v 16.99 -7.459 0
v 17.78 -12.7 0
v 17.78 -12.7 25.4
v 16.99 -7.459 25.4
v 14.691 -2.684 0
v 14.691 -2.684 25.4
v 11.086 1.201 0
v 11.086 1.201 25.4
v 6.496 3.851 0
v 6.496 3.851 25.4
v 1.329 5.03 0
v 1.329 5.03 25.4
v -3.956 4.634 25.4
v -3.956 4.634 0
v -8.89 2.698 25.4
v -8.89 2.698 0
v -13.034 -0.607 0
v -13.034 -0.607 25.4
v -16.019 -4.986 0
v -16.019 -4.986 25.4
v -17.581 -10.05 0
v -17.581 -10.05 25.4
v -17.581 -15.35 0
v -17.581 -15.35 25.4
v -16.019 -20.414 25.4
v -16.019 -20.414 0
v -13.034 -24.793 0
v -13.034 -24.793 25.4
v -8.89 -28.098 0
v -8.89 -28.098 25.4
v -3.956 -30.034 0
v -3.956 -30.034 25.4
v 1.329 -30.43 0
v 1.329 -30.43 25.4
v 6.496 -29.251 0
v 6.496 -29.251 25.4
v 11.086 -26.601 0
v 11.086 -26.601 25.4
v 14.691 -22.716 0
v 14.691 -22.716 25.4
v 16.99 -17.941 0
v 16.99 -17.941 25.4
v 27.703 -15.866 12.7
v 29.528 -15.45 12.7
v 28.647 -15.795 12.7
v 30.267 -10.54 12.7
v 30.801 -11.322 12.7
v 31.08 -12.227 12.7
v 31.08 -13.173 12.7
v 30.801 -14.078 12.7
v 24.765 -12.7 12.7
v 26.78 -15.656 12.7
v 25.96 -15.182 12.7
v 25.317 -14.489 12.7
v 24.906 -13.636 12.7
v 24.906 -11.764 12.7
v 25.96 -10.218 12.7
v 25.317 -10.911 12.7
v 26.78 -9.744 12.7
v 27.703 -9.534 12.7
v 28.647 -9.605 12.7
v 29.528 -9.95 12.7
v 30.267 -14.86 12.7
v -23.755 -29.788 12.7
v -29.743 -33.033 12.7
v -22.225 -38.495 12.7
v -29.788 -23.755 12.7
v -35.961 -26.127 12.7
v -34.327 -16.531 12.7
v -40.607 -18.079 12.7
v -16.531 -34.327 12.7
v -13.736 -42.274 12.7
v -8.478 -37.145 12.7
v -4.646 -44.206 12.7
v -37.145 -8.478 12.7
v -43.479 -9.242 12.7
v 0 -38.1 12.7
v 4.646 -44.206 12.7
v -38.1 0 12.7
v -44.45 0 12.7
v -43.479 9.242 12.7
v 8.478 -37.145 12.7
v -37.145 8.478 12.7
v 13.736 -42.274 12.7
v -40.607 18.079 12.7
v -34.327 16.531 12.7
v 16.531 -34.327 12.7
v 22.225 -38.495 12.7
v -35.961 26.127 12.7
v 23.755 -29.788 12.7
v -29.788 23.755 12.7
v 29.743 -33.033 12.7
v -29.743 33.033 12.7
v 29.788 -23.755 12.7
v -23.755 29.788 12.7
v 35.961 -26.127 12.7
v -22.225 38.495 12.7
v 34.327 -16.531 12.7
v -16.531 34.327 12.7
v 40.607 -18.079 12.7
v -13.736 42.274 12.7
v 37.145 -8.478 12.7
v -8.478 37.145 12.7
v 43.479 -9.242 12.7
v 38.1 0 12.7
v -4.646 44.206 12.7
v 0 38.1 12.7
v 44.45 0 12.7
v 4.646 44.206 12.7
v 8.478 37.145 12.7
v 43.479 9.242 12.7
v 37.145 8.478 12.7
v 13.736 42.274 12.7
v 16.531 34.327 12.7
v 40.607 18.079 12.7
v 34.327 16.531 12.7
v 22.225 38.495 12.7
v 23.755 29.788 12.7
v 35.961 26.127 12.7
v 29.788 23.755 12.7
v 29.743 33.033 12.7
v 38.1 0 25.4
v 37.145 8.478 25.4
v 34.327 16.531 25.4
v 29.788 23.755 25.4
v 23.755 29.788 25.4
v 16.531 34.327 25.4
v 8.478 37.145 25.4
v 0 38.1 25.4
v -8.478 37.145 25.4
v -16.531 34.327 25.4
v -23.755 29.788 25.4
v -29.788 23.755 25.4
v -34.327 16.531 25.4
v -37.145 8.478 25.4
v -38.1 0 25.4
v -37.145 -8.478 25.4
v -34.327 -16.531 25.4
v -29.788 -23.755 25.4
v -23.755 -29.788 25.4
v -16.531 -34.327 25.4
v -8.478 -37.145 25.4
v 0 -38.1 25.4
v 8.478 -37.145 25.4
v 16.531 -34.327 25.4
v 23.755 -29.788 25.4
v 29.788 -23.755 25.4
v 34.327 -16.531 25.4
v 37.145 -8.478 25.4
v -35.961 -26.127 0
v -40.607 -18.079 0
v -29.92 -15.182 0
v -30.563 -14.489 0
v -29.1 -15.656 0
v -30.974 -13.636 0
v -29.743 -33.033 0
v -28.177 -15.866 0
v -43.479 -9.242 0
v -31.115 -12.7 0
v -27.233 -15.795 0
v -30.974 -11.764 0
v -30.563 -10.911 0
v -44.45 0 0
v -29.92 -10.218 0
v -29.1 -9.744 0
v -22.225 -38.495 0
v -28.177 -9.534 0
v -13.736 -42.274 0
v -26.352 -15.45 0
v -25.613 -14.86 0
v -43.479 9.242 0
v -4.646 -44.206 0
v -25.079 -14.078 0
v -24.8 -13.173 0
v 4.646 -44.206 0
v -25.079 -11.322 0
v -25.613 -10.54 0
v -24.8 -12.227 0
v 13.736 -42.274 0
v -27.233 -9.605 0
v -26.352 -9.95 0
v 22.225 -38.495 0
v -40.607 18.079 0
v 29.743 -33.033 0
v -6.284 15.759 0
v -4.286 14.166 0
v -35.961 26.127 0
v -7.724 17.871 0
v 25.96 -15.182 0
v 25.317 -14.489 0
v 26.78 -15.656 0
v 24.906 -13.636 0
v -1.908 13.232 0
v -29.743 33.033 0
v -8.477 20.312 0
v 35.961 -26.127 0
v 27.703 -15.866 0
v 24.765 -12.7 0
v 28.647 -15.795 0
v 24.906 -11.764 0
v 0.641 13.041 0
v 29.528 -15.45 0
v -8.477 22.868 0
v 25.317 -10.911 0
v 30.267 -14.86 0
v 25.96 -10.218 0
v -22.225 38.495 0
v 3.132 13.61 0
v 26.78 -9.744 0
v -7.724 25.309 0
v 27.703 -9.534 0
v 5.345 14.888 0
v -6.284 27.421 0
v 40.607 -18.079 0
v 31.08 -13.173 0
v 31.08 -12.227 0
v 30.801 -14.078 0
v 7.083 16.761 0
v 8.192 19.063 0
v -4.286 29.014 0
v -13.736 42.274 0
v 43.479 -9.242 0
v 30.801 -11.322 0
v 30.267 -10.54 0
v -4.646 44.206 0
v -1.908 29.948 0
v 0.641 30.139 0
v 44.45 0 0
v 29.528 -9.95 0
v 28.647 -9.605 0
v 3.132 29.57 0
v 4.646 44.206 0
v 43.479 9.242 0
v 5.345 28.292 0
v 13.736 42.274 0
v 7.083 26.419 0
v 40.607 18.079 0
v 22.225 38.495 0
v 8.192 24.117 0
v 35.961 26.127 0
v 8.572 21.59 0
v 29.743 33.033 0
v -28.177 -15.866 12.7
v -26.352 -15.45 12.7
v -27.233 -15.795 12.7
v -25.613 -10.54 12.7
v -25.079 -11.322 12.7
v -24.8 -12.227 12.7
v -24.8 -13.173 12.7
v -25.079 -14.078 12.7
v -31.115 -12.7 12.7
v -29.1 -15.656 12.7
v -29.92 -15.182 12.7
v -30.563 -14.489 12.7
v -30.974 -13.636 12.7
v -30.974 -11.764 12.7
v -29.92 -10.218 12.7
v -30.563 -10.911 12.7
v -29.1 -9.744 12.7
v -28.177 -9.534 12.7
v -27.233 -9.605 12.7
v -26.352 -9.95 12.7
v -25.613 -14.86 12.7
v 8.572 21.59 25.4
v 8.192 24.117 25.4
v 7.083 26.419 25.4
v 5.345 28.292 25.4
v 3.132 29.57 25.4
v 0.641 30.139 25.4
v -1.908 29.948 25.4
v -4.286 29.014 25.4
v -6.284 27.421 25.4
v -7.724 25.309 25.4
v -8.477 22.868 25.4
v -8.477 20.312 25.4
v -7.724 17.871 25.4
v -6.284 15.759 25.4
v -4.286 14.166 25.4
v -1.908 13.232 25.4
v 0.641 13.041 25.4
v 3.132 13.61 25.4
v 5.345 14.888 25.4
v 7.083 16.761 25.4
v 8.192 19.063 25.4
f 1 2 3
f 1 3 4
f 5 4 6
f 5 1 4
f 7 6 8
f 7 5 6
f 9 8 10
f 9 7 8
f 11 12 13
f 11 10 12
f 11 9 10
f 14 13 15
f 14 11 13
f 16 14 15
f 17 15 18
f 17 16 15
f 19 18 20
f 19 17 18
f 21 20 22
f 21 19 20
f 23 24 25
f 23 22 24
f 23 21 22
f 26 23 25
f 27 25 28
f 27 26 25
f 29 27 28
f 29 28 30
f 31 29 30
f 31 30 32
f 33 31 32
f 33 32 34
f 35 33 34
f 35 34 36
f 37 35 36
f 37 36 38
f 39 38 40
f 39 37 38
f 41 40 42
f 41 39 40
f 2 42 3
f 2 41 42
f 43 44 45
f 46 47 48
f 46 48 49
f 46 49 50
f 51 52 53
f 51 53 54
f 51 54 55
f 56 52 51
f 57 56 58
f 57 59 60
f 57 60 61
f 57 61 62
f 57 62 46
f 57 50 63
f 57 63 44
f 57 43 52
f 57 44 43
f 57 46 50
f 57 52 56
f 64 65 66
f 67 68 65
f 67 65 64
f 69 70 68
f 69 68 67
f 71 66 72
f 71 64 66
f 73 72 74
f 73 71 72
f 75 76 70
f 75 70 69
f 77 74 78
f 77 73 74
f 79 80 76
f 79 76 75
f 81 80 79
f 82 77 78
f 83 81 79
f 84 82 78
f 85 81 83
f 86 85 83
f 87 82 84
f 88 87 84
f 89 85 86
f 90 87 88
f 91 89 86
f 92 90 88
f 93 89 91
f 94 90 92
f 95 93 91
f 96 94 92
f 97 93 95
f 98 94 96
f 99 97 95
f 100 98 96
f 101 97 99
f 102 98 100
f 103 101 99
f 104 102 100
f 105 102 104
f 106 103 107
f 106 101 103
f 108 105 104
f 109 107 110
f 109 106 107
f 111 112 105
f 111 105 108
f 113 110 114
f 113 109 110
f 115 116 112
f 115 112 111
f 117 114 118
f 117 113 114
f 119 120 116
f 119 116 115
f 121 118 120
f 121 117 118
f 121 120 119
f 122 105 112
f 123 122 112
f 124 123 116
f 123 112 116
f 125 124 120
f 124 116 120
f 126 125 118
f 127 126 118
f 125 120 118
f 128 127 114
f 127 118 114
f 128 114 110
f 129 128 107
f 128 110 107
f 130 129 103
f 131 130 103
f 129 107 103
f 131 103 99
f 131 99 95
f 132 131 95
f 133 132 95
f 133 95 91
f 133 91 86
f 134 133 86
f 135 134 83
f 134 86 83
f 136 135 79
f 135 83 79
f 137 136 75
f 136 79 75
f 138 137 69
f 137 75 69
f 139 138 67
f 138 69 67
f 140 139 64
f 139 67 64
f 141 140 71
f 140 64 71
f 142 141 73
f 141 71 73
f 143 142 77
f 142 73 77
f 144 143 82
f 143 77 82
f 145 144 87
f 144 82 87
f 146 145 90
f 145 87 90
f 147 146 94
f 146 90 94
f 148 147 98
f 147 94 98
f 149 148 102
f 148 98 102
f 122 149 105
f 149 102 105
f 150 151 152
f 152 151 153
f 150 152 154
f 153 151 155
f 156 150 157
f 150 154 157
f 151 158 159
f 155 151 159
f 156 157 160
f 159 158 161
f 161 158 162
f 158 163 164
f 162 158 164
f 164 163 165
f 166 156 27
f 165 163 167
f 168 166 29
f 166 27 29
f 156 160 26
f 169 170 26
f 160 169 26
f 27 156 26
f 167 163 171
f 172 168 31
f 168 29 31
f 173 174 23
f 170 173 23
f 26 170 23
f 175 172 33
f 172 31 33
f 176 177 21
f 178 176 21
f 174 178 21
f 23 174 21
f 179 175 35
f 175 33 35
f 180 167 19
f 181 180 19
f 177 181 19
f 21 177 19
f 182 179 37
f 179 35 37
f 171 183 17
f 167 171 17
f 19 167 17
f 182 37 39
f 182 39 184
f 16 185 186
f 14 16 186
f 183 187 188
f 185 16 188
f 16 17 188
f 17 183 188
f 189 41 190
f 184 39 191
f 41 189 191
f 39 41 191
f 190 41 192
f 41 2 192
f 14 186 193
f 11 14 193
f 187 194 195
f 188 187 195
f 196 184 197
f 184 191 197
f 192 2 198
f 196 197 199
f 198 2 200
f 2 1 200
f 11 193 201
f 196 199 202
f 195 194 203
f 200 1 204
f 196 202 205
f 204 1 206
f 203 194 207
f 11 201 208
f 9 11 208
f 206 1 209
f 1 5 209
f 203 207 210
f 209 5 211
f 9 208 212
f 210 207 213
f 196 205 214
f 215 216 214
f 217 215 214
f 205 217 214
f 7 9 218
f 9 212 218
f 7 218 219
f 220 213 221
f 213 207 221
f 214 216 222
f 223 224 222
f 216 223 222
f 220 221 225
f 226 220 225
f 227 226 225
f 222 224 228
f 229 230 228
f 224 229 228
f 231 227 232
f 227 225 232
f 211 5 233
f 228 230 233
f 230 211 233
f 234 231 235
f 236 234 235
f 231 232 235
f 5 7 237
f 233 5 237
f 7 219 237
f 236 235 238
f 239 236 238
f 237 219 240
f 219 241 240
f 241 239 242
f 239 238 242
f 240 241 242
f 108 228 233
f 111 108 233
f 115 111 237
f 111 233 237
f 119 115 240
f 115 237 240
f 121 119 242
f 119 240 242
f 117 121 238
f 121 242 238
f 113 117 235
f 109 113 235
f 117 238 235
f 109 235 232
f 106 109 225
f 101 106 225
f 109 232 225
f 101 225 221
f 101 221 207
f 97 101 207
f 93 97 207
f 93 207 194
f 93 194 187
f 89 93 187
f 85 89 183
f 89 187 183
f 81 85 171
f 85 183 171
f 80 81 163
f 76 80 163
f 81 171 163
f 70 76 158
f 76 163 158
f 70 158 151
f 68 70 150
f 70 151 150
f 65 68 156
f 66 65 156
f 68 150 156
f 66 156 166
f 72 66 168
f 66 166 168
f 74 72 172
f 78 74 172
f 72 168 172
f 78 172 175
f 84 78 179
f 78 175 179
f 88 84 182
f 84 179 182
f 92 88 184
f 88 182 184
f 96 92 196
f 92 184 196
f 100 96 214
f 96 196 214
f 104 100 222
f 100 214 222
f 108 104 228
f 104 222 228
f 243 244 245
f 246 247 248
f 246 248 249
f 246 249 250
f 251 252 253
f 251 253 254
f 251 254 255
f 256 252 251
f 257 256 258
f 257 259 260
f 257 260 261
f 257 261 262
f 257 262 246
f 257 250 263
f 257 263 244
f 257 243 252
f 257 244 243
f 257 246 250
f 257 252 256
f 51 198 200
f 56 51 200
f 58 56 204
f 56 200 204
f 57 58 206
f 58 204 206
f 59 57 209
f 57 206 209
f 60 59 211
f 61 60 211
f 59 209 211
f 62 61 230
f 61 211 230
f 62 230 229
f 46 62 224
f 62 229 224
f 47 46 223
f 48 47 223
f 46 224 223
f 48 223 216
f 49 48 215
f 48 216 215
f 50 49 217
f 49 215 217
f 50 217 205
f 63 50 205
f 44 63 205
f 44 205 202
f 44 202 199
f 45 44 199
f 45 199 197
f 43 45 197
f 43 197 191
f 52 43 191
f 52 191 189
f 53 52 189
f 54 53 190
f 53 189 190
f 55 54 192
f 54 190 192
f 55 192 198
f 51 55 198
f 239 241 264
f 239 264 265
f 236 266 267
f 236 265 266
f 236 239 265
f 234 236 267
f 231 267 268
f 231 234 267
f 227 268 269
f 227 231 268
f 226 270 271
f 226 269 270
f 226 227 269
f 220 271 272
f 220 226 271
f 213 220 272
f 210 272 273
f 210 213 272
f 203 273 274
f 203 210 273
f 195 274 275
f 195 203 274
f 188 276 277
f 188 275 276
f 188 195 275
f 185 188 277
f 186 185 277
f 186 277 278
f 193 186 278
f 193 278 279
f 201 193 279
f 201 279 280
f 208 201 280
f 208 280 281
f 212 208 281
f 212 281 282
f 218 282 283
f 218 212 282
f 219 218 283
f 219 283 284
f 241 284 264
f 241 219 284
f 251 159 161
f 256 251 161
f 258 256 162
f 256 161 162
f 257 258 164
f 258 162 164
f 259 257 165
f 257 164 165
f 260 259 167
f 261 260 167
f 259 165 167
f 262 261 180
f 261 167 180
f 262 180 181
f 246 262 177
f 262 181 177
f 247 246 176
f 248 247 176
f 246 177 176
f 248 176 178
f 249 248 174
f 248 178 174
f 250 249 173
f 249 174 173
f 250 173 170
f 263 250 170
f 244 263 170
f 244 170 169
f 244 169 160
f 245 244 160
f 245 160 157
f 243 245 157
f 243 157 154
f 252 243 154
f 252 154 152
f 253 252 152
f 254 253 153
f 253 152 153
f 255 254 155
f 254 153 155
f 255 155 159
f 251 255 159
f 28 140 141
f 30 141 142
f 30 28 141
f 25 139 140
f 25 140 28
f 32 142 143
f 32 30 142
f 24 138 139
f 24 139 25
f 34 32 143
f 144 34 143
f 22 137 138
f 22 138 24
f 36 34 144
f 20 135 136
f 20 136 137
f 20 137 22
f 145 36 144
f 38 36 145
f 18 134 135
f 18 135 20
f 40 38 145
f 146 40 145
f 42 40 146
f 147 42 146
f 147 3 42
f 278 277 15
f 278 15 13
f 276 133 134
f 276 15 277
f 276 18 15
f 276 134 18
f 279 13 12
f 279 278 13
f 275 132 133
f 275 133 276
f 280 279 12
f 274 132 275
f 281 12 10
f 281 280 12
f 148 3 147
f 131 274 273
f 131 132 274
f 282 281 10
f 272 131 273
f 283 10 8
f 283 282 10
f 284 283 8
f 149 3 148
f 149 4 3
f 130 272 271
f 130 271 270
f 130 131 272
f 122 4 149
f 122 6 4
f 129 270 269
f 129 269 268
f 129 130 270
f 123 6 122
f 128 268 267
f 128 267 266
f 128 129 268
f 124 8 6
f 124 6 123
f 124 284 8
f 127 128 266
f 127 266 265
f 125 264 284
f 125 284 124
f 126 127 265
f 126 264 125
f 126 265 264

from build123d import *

# Parameters (mm, degrees)
SKETCH1_R               = 44.45
BOSS_EXTRUDE1_DEPTH     = 12.7
SKETCH2_R               = 38.1
BOSS_EXTRUDE2_DEPTH     = 12.7
CUT_EXTRUDE1_DEPTH      = 68.7994469
CUT_EXTRUDE1_DEPTH_BACK = 68.7994469
SKETCH3_R               = 8.5725
CUT_EXTRUDE3_DEPTH      = 68.7994469
CUT_EXTRUDE3_DEPTH_BACK = 68.7994469
SKETCH4_R               = 17.78
SKETCH5_R               = 3.175
CUT_EXTRUDE4_DEPTH      = 12.7


with BuildPart() as part:
    # Sketch1 → Boss-Extrude1 (new body)
    with BuildSketch(Plane.XY):
        Circle(SKETCH1_R)
    extrude(amount=BOSS_EXTRUDE1_DEPTH)

    # Sketch2 → Boss-Extrude2 (add)
    with BuildSketch(Plane.XY.offset(12.7)):
        Circle(SKETCH2_R)
    extrude(amount=BOSS_EXTRUDE2_DEPTH)

    # Sketch3 → Cut-Extrude1 (cut, two sides: drawn at the far end of the back side and taken through both)
    with BuildSketch(Plane.XY.offset(25.4).offset(-CUT_EXTRUDE1_DEPTH_BACK)):
        with Locations((0, 21.59)):
            Circle(SKETCH3_R)
    extrude(amount=CUT_EXTRUDE1_DEPTH + CUT_EXTRUDE1_DEPTH_BACK, mode=Mode.SUBTRACT)

    # Sketch4 → Cut-Extrude3 (cut, two sides: drawn at the far end of the back side and taken through both)
    with BuildSketch(Plane.XY.offset(25.4).offset(-CUT_EXTRUDE3_DEPTH_BACK)):
        with Locations((0, -12.7)):
            Circle(SKETCH4_R)
    extrude(amount=CUT_EXTRUDE3_DEPTH + CUT_EXTRUDE3_DEPTH_BACK, mode=Mode.SUBTRACT)

    # Sketch5 → Cut-Extrude4 (cut)
    with BuildSketch(Plane(origin=(0, 0, 0), x_dir=(-1, 0, 0), z_dir=(0, 0, -1))):
        with Locations((27.94, -12.7)):
            Circle(SKETCH5_R)
        with Locations((-27.94, -12.7)):
            Circle(SKETCH5_R)
    extrude(amount=-CUT_EXTRUDE4_DEPTH, mode=Mode.SUBTRACT)


solid = part.part
